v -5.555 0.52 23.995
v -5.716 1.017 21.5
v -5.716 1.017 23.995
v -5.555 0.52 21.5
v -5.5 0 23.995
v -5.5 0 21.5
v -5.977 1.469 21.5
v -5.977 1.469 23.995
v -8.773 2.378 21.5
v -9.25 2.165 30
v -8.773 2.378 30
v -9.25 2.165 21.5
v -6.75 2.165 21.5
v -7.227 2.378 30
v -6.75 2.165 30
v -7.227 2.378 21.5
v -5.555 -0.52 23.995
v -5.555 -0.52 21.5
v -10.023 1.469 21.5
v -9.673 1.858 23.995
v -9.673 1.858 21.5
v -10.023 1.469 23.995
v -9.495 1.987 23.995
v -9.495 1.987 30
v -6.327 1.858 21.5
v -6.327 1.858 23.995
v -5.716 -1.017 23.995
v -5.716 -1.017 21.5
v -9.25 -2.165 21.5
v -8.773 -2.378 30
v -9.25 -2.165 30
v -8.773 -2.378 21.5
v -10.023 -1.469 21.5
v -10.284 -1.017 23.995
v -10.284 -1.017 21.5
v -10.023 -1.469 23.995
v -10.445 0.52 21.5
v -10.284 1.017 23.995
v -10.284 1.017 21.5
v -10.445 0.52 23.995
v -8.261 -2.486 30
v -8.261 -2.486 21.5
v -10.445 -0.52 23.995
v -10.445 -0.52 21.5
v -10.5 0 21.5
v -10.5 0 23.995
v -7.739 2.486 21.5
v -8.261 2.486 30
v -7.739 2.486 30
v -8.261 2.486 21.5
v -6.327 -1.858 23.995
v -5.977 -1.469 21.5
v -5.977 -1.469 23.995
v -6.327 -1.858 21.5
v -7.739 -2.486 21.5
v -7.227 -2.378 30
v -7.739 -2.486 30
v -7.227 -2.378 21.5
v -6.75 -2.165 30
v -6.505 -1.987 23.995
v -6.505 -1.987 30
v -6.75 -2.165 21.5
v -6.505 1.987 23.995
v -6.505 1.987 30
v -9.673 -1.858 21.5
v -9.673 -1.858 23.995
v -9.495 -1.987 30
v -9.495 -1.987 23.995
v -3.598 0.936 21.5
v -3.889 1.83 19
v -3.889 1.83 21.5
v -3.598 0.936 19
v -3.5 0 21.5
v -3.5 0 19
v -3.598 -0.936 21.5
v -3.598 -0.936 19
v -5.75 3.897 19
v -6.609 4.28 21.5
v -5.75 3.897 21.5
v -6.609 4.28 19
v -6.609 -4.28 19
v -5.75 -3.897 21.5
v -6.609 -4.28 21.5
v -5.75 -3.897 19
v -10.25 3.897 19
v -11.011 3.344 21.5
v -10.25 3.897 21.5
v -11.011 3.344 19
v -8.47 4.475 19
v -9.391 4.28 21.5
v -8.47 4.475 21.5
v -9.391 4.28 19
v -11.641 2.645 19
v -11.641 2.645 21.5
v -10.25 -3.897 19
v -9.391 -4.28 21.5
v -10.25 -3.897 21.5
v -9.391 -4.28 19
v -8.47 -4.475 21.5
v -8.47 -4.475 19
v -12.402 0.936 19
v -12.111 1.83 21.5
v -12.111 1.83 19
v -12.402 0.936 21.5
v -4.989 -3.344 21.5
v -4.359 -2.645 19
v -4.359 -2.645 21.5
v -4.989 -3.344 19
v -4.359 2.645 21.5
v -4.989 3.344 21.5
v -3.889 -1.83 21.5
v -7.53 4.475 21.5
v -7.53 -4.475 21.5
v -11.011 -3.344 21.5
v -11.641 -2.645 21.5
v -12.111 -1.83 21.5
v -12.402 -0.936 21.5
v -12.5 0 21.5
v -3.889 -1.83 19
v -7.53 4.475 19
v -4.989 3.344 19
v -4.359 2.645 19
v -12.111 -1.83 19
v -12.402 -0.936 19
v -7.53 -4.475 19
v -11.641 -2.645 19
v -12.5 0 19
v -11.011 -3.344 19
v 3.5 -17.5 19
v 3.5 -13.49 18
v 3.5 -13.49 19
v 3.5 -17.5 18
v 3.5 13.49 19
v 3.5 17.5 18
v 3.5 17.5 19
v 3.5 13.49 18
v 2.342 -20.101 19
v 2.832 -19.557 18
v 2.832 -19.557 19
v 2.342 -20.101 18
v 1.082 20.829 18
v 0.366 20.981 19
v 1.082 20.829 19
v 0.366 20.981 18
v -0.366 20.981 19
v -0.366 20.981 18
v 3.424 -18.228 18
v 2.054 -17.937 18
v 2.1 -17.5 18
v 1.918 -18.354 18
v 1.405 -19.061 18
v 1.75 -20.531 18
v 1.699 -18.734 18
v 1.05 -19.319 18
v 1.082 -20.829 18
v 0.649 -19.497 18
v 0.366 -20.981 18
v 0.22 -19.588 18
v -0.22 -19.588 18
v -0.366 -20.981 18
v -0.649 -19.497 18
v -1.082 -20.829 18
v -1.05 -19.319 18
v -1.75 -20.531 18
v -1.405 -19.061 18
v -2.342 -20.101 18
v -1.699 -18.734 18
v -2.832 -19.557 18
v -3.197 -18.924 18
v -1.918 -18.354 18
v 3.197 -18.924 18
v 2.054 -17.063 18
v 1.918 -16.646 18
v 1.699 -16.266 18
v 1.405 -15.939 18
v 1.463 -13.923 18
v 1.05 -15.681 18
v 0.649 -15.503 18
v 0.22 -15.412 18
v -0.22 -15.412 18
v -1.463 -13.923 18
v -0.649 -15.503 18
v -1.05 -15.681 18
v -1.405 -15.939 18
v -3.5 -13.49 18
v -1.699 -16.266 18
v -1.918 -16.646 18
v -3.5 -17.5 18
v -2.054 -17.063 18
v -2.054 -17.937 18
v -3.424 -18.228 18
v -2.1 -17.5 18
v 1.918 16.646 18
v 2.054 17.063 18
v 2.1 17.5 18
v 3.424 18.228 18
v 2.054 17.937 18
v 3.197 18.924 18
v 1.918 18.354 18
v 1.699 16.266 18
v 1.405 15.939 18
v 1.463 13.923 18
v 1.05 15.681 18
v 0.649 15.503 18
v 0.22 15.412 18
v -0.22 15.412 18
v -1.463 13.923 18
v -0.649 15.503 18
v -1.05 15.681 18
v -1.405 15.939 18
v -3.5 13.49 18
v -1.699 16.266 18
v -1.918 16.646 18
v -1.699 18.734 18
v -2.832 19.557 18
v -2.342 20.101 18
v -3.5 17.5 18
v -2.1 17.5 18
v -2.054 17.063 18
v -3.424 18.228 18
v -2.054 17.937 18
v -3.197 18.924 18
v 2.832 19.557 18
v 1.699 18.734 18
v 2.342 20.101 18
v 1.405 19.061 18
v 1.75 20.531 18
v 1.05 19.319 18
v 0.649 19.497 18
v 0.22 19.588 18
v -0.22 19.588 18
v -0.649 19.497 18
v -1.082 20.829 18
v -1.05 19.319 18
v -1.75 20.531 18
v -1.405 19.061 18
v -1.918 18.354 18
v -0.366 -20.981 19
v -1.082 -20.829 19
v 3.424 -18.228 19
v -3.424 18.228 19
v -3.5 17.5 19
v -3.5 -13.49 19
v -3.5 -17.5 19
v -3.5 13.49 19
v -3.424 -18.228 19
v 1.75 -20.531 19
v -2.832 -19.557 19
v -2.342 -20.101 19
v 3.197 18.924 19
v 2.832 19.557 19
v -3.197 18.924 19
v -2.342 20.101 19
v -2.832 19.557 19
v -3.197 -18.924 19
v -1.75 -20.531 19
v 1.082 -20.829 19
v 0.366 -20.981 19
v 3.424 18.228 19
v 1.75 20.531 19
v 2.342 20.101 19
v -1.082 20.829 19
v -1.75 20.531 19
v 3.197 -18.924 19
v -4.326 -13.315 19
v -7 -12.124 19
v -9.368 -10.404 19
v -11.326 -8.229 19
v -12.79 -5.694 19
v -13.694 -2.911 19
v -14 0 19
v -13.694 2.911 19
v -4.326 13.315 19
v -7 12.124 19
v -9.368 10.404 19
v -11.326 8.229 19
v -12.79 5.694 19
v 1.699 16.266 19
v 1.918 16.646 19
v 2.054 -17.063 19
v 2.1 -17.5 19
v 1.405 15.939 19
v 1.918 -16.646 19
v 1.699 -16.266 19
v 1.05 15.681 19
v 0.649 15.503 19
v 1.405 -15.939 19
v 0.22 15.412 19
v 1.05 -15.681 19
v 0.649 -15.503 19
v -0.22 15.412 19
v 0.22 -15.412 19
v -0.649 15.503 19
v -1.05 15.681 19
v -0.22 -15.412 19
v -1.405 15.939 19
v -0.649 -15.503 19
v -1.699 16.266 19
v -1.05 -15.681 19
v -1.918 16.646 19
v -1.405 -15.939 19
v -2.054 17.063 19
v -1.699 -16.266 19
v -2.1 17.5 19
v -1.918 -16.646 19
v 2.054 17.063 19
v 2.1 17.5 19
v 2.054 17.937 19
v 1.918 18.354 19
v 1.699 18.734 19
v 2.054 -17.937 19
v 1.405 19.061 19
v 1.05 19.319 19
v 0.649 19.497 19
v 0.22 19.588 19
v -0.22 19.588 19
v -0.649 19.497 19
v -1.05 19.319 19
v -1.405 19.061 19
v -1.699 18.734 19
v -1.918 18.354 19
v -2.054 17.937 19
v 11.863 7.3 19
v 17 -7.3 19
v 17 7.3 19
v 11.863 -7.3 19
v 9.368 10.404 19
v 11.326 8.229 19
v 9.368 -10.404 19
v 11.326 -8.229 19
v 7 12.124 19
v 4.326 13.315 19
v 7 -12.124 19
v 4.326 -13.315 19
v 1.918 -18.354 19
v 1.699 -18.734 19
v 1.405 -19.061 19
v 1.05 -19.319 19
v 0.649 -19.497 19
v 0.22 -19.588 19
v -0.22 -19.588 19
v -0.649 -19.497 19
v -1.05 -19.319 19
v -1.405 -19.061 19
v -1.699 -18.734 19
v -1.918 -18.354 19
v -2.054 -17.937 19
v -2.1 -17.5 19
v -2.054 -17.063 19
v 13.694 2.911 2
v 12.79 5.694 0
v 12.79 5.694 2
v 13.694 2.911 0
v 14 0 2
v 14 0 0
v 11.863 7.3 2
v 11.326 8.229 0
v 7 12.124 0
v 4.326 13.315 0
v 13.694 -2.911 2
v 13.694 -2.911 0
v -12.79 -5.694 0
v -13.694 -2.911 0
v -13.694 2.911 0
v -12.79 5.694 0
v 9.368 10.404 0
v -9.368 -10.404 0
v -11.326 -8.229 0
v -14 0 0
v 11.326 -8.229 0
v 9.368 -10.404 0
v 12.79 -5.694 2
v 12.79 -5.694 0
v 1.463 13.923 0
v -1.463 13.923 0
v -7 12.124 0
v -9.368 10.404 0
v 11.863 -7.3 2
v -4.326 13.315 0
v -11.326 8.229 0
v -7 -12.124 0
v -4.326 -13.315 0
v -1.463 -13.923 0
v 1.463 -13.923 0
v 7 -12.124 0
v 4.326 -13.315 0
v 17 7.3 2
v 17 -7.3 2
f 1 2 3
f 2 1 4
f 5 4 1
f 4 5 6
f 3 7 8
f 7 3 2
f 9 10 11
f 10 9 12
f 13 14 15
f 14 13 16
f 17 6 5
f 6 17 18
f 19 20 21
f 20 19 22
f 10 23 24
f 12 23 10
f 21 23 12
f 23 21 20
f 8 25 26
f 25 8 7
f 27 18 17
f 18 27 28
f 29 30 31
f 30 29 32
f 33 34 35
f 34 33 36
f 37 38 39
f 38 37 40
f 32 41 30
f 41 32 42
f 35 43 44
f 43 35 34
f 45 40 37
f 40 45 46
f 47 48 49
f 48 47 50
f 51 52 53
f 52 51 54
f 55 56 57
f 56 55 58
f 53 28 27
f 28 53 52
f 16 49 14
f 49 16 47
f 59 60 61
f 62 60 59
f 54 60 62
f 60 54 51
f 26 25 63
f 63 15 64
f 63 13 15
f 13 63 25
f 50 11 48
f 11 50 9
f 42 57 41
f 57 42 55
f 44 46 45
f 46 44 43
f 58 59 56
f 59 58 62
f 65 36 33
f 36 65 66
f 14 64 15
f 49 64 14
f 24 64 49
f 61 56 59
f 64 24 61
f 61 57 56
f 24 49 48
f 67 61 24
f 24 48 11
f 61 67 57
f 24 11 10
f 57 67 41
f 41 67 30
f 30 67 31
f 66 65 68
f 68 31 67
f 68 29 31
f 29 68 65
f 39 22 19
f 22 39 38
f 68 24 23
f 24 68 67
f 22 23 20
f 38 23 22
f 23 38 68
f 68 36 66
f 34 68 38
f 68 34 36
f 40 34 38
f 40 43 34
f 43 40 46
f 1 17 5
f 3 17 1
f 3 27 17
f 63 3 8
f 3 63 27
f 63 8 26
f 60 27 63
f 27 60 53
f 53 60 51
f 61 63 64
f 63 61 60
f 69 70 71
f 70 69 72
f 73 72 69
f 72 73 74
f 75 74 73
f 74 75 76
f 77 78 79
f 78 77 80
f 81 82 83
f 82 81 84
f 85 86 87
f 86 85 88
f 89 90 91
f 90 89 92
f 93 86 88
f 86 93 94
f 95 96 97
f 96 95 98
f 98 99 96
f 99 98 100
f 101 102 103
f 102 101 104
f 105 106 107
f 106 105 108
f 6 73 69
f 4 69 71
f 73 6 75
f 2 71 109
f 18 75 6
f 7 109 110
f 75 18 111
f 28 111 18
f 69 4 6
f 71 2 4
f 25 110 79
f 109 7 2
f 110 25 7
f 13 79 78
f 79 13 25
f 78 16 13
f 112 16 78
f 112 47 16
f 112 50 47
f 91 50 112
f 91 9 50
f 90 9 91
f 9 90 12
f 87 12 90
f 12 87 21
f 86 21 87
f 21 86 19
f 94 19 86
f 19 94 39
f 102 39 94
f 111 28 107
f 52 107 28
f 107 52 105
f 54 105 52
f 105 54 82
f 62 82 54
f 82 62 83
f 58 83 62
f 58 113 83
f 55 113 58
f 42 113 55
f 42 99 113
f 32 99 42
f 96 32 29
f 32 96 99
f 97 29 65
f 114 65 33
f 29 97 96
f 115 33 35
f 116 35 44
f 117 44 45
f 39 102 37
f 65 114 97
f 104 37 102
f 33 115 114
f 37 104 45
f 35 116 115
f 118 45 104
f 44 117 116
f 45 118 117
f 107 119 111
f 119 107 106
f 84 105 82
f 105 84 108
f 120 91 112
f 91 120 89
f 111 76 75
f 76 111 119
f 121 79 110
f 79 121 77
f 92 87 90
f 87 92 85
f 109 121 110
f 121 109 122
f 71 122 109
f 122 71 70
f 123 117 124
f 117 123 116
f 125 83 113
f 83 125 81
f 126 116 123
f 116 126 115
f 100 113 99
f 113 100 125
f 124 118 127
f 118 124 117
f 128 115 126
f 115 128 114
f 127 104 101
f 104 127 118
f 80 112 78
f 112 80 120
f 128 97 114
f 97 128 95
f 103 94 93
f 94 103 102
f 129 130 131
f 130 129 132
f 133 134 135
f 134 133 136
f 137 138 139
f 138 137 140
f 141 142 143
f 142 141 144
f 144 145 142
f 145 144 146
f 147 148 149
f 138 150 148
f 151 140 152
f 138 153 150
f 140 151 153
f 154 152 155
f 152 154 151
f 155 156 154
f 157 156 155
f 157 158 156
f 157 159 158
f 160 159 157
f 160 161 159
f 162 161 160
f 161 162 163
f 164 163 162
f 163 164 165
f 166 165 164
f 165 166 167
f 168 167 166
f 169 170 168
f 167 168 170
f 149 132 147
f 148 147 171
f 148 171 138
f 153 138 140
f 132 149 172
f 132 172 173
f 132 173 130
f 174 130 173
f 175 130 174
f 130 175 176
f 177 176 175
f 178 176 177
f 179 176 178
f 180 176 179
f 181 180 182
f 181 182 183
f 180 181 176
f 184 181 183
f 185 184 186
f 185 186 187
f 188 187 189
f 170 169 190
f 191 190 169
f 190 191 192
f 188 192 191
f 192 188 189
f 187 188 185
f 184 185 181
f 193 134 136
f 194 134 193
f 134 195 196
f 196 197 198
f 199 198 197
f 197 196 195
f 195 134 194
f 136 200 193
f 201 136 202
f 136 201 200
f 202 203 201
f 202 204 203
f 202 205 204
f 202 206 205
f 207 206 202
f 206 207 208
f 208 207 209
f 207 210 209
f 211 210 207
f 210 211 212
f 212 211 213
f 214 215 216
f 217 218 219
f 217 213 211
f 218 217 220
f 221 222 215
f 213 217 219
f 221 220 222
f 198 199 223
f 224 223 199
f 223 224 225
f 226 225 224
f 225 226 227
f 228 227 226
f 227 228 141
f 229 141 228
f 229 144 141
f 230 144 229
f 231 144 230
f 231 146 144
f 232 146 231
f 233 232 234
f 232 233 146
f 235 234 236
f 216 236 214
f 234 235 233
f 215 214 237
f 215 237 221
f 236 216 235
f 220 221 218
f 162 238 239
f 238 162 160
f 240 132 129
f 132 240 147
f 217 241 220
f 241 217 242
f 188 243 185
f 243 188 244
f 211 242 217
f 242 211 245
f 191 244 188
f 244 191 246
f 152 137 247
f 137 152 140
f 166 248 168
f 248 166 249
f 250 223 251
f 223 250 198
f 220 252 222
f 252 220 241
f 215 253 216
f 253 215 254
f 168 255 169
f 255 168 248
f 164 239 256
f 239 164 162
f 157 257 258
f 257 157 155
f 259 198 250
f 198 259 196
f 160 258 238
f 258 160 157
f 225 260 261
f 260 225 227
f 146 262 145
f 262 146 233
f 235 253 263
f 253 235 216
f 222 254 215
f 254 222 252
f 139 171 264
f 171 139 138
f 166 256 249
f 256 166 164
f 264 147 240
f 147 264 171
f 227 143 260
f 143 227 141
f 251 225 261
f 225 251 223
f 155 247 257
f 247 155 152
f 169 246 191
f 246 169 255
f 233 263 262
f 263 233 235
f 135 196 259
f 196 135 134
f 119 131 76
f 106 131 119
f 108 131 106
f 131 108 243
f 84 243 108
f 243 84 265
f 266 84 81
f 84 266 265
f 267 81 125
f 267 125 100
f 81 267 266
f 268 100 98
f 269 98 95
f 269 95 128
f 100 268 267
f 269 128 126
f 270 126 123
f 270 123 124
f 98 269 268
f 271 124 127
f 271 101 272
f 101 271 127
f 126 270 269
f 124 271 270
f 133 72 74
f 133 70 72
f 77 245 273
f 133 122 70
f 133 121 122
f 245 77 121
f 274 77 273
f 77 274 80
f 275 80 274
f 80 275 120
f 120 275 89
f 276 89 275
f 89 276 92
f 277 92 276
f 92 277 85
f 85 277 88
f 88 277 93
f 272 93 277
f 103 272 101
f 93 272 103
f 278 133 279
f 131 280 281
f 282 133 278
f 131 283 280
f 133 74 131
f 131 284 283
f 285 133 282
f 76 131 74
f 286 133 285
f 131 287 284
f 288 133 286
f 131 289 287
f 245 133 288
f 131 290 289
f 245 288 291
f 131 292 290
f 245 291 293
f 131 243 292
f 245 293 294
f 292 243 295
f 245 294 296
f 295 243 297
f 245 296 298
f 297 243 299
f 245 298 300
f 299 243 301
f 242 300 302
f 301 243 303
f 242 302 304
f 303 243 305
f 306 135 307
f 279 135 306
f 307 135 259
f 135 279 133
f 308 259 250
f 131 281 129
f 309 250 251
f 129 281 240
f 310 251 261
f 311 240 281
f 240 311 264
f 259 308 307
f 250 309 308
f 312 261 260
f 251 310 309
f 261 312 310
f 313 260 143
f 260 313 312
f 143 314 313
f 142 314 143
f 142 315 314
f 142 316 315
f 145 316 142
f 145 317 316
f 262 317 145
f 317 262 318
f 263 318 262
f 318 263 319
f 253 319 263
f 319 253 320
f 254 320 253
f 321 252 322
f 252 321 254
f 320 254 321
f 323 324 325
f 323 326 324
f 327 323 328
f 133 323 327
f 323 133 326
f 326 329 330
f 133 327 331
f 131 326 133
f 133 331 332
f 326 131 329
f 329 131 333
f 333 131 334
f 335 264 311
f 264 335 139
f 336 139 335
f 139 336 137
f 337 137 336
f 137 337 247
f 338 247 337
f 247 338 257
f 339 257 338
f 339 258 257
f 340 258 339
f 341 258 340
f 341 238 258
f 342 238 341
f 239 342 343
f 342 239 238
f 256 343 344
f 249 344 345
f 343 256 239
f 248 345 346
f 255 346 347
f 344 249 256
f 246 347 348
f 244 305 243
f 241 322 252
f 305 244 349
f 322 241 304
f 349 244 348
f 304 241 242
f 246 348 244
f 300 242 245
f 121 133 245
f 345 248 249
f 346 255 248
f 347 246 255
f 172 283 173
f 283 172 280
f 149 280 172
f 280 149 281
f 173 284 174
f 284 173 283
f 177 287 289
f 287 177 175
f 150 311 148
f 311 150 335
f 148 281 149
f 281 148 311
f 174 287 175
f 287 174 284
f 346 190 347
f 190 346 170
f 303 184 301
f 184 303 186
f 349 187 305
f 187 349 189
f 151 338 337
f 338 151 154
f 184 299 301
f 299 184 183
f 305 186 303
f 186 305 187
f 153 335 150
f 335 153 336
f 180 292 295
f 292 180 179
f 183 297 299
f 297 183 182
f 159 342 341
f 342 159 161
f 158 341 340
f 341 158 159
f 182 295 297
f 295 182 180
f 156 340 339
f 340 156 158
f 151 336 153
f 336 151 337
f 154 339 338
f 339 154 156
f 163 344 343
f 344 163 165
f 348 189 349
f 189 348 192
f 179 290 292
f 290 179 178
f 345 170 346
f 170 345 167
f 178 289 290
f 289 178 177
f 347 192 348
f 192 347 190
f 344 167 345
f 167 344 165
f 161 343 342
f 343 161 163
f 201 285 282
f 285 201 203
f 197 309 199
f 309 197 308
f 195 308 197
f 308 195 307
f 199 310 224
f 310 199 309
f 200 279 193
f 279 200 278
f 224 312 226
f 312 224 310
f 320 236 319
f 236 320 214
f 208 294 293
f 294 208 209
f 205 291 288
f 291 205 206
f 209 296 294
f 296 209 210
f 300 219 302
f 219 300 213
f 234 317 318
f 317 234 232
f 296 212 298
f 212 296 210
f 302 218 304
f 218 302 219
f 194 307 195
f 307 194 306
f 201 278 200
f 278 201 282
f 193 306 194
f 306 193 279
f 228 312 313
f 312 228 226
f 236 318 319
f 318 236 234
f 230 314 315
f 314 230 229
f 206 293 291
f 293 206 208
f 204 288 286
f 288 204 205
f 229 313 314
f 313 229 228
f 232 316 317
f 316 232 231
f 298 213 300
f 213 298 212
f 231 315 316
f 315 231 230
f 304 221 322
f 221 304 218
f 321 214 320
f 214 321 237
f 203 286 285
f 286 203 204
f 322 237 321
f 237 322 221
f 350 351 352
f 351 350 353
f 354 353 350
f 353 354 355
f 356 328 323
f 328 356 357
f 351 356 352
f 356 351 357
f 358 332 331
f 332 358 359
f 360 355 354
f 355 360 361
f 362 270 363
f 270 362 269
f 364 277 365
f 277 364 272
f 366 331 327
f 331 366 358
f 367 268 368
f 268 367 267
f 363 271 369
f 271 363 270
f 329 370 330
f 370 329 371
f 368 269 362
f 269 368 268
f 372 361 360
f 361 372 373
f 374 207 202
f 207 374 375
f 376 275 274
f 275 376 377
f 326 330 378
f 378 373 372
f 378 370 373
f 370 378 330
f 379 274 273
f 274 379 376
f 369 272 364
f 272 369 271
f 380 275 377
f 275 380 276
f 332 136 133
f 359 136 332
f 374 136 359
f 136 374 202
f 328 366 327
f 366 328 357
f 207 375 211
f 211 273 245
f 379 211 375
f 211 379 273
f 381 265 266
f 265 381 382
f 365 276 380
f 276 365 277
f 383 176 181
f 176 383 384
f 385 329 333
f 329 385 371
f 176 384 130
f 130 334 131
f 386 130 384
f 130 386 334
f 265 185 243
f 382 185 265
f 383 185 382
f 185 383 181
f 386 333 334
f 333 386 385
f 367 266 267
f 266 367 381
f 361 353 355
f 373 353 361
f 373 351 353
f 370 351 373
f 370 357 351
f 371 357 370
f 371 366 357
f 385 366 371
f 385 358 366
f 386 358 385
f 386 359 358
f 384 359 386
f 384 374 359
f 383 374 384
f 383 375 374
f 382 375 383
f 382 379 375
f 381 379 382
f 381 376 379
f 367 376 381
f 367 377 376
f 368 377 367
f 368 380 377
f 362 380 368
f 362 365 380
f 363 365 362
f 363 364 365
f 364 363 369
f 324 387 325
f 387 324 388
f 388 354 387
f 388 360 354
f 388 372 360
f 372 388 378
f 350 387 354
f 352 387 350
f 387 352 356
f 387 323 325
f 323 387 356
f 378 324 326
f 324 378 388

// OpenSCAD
// NAME: Stepper 28BYJ Motor
// CATEGORY: Motor
// COLOR: 493

$fn=30;

module stepper_28BYJ_motor(){
    cylinder(d=28, h=19);
    translate([0, -14.6/2, 2])
        cube([17, 14.6, 17]);

    translate([-8,0,1]){
        cylinder(d=9, h=19+1.5);

        difference(){
            cylinder(d=5, h=19+10);
            translate([-3-1.5,0,19+10-3])
                cube(6.01, center=true);
            translate([3+1.5,0,19+10-3])
                cube(6.01, center=true);

        }}

    difference(){
        hull(){
            translate([0,-35/2,19-1])
                cylinder(d=7, h=1);
            translate([0,35/2,19-1])
                cylinder(d=7, h=1);
        }

        translate([0,-35/2,19-1.01])
            cylinder(d=4.2, h=1.02);

        translate([0,35/2,19-1.01])
            cylinder(d=4.2, h=1.02);
    }
}

color("Silver")
stepper_28BYJ_motor();
